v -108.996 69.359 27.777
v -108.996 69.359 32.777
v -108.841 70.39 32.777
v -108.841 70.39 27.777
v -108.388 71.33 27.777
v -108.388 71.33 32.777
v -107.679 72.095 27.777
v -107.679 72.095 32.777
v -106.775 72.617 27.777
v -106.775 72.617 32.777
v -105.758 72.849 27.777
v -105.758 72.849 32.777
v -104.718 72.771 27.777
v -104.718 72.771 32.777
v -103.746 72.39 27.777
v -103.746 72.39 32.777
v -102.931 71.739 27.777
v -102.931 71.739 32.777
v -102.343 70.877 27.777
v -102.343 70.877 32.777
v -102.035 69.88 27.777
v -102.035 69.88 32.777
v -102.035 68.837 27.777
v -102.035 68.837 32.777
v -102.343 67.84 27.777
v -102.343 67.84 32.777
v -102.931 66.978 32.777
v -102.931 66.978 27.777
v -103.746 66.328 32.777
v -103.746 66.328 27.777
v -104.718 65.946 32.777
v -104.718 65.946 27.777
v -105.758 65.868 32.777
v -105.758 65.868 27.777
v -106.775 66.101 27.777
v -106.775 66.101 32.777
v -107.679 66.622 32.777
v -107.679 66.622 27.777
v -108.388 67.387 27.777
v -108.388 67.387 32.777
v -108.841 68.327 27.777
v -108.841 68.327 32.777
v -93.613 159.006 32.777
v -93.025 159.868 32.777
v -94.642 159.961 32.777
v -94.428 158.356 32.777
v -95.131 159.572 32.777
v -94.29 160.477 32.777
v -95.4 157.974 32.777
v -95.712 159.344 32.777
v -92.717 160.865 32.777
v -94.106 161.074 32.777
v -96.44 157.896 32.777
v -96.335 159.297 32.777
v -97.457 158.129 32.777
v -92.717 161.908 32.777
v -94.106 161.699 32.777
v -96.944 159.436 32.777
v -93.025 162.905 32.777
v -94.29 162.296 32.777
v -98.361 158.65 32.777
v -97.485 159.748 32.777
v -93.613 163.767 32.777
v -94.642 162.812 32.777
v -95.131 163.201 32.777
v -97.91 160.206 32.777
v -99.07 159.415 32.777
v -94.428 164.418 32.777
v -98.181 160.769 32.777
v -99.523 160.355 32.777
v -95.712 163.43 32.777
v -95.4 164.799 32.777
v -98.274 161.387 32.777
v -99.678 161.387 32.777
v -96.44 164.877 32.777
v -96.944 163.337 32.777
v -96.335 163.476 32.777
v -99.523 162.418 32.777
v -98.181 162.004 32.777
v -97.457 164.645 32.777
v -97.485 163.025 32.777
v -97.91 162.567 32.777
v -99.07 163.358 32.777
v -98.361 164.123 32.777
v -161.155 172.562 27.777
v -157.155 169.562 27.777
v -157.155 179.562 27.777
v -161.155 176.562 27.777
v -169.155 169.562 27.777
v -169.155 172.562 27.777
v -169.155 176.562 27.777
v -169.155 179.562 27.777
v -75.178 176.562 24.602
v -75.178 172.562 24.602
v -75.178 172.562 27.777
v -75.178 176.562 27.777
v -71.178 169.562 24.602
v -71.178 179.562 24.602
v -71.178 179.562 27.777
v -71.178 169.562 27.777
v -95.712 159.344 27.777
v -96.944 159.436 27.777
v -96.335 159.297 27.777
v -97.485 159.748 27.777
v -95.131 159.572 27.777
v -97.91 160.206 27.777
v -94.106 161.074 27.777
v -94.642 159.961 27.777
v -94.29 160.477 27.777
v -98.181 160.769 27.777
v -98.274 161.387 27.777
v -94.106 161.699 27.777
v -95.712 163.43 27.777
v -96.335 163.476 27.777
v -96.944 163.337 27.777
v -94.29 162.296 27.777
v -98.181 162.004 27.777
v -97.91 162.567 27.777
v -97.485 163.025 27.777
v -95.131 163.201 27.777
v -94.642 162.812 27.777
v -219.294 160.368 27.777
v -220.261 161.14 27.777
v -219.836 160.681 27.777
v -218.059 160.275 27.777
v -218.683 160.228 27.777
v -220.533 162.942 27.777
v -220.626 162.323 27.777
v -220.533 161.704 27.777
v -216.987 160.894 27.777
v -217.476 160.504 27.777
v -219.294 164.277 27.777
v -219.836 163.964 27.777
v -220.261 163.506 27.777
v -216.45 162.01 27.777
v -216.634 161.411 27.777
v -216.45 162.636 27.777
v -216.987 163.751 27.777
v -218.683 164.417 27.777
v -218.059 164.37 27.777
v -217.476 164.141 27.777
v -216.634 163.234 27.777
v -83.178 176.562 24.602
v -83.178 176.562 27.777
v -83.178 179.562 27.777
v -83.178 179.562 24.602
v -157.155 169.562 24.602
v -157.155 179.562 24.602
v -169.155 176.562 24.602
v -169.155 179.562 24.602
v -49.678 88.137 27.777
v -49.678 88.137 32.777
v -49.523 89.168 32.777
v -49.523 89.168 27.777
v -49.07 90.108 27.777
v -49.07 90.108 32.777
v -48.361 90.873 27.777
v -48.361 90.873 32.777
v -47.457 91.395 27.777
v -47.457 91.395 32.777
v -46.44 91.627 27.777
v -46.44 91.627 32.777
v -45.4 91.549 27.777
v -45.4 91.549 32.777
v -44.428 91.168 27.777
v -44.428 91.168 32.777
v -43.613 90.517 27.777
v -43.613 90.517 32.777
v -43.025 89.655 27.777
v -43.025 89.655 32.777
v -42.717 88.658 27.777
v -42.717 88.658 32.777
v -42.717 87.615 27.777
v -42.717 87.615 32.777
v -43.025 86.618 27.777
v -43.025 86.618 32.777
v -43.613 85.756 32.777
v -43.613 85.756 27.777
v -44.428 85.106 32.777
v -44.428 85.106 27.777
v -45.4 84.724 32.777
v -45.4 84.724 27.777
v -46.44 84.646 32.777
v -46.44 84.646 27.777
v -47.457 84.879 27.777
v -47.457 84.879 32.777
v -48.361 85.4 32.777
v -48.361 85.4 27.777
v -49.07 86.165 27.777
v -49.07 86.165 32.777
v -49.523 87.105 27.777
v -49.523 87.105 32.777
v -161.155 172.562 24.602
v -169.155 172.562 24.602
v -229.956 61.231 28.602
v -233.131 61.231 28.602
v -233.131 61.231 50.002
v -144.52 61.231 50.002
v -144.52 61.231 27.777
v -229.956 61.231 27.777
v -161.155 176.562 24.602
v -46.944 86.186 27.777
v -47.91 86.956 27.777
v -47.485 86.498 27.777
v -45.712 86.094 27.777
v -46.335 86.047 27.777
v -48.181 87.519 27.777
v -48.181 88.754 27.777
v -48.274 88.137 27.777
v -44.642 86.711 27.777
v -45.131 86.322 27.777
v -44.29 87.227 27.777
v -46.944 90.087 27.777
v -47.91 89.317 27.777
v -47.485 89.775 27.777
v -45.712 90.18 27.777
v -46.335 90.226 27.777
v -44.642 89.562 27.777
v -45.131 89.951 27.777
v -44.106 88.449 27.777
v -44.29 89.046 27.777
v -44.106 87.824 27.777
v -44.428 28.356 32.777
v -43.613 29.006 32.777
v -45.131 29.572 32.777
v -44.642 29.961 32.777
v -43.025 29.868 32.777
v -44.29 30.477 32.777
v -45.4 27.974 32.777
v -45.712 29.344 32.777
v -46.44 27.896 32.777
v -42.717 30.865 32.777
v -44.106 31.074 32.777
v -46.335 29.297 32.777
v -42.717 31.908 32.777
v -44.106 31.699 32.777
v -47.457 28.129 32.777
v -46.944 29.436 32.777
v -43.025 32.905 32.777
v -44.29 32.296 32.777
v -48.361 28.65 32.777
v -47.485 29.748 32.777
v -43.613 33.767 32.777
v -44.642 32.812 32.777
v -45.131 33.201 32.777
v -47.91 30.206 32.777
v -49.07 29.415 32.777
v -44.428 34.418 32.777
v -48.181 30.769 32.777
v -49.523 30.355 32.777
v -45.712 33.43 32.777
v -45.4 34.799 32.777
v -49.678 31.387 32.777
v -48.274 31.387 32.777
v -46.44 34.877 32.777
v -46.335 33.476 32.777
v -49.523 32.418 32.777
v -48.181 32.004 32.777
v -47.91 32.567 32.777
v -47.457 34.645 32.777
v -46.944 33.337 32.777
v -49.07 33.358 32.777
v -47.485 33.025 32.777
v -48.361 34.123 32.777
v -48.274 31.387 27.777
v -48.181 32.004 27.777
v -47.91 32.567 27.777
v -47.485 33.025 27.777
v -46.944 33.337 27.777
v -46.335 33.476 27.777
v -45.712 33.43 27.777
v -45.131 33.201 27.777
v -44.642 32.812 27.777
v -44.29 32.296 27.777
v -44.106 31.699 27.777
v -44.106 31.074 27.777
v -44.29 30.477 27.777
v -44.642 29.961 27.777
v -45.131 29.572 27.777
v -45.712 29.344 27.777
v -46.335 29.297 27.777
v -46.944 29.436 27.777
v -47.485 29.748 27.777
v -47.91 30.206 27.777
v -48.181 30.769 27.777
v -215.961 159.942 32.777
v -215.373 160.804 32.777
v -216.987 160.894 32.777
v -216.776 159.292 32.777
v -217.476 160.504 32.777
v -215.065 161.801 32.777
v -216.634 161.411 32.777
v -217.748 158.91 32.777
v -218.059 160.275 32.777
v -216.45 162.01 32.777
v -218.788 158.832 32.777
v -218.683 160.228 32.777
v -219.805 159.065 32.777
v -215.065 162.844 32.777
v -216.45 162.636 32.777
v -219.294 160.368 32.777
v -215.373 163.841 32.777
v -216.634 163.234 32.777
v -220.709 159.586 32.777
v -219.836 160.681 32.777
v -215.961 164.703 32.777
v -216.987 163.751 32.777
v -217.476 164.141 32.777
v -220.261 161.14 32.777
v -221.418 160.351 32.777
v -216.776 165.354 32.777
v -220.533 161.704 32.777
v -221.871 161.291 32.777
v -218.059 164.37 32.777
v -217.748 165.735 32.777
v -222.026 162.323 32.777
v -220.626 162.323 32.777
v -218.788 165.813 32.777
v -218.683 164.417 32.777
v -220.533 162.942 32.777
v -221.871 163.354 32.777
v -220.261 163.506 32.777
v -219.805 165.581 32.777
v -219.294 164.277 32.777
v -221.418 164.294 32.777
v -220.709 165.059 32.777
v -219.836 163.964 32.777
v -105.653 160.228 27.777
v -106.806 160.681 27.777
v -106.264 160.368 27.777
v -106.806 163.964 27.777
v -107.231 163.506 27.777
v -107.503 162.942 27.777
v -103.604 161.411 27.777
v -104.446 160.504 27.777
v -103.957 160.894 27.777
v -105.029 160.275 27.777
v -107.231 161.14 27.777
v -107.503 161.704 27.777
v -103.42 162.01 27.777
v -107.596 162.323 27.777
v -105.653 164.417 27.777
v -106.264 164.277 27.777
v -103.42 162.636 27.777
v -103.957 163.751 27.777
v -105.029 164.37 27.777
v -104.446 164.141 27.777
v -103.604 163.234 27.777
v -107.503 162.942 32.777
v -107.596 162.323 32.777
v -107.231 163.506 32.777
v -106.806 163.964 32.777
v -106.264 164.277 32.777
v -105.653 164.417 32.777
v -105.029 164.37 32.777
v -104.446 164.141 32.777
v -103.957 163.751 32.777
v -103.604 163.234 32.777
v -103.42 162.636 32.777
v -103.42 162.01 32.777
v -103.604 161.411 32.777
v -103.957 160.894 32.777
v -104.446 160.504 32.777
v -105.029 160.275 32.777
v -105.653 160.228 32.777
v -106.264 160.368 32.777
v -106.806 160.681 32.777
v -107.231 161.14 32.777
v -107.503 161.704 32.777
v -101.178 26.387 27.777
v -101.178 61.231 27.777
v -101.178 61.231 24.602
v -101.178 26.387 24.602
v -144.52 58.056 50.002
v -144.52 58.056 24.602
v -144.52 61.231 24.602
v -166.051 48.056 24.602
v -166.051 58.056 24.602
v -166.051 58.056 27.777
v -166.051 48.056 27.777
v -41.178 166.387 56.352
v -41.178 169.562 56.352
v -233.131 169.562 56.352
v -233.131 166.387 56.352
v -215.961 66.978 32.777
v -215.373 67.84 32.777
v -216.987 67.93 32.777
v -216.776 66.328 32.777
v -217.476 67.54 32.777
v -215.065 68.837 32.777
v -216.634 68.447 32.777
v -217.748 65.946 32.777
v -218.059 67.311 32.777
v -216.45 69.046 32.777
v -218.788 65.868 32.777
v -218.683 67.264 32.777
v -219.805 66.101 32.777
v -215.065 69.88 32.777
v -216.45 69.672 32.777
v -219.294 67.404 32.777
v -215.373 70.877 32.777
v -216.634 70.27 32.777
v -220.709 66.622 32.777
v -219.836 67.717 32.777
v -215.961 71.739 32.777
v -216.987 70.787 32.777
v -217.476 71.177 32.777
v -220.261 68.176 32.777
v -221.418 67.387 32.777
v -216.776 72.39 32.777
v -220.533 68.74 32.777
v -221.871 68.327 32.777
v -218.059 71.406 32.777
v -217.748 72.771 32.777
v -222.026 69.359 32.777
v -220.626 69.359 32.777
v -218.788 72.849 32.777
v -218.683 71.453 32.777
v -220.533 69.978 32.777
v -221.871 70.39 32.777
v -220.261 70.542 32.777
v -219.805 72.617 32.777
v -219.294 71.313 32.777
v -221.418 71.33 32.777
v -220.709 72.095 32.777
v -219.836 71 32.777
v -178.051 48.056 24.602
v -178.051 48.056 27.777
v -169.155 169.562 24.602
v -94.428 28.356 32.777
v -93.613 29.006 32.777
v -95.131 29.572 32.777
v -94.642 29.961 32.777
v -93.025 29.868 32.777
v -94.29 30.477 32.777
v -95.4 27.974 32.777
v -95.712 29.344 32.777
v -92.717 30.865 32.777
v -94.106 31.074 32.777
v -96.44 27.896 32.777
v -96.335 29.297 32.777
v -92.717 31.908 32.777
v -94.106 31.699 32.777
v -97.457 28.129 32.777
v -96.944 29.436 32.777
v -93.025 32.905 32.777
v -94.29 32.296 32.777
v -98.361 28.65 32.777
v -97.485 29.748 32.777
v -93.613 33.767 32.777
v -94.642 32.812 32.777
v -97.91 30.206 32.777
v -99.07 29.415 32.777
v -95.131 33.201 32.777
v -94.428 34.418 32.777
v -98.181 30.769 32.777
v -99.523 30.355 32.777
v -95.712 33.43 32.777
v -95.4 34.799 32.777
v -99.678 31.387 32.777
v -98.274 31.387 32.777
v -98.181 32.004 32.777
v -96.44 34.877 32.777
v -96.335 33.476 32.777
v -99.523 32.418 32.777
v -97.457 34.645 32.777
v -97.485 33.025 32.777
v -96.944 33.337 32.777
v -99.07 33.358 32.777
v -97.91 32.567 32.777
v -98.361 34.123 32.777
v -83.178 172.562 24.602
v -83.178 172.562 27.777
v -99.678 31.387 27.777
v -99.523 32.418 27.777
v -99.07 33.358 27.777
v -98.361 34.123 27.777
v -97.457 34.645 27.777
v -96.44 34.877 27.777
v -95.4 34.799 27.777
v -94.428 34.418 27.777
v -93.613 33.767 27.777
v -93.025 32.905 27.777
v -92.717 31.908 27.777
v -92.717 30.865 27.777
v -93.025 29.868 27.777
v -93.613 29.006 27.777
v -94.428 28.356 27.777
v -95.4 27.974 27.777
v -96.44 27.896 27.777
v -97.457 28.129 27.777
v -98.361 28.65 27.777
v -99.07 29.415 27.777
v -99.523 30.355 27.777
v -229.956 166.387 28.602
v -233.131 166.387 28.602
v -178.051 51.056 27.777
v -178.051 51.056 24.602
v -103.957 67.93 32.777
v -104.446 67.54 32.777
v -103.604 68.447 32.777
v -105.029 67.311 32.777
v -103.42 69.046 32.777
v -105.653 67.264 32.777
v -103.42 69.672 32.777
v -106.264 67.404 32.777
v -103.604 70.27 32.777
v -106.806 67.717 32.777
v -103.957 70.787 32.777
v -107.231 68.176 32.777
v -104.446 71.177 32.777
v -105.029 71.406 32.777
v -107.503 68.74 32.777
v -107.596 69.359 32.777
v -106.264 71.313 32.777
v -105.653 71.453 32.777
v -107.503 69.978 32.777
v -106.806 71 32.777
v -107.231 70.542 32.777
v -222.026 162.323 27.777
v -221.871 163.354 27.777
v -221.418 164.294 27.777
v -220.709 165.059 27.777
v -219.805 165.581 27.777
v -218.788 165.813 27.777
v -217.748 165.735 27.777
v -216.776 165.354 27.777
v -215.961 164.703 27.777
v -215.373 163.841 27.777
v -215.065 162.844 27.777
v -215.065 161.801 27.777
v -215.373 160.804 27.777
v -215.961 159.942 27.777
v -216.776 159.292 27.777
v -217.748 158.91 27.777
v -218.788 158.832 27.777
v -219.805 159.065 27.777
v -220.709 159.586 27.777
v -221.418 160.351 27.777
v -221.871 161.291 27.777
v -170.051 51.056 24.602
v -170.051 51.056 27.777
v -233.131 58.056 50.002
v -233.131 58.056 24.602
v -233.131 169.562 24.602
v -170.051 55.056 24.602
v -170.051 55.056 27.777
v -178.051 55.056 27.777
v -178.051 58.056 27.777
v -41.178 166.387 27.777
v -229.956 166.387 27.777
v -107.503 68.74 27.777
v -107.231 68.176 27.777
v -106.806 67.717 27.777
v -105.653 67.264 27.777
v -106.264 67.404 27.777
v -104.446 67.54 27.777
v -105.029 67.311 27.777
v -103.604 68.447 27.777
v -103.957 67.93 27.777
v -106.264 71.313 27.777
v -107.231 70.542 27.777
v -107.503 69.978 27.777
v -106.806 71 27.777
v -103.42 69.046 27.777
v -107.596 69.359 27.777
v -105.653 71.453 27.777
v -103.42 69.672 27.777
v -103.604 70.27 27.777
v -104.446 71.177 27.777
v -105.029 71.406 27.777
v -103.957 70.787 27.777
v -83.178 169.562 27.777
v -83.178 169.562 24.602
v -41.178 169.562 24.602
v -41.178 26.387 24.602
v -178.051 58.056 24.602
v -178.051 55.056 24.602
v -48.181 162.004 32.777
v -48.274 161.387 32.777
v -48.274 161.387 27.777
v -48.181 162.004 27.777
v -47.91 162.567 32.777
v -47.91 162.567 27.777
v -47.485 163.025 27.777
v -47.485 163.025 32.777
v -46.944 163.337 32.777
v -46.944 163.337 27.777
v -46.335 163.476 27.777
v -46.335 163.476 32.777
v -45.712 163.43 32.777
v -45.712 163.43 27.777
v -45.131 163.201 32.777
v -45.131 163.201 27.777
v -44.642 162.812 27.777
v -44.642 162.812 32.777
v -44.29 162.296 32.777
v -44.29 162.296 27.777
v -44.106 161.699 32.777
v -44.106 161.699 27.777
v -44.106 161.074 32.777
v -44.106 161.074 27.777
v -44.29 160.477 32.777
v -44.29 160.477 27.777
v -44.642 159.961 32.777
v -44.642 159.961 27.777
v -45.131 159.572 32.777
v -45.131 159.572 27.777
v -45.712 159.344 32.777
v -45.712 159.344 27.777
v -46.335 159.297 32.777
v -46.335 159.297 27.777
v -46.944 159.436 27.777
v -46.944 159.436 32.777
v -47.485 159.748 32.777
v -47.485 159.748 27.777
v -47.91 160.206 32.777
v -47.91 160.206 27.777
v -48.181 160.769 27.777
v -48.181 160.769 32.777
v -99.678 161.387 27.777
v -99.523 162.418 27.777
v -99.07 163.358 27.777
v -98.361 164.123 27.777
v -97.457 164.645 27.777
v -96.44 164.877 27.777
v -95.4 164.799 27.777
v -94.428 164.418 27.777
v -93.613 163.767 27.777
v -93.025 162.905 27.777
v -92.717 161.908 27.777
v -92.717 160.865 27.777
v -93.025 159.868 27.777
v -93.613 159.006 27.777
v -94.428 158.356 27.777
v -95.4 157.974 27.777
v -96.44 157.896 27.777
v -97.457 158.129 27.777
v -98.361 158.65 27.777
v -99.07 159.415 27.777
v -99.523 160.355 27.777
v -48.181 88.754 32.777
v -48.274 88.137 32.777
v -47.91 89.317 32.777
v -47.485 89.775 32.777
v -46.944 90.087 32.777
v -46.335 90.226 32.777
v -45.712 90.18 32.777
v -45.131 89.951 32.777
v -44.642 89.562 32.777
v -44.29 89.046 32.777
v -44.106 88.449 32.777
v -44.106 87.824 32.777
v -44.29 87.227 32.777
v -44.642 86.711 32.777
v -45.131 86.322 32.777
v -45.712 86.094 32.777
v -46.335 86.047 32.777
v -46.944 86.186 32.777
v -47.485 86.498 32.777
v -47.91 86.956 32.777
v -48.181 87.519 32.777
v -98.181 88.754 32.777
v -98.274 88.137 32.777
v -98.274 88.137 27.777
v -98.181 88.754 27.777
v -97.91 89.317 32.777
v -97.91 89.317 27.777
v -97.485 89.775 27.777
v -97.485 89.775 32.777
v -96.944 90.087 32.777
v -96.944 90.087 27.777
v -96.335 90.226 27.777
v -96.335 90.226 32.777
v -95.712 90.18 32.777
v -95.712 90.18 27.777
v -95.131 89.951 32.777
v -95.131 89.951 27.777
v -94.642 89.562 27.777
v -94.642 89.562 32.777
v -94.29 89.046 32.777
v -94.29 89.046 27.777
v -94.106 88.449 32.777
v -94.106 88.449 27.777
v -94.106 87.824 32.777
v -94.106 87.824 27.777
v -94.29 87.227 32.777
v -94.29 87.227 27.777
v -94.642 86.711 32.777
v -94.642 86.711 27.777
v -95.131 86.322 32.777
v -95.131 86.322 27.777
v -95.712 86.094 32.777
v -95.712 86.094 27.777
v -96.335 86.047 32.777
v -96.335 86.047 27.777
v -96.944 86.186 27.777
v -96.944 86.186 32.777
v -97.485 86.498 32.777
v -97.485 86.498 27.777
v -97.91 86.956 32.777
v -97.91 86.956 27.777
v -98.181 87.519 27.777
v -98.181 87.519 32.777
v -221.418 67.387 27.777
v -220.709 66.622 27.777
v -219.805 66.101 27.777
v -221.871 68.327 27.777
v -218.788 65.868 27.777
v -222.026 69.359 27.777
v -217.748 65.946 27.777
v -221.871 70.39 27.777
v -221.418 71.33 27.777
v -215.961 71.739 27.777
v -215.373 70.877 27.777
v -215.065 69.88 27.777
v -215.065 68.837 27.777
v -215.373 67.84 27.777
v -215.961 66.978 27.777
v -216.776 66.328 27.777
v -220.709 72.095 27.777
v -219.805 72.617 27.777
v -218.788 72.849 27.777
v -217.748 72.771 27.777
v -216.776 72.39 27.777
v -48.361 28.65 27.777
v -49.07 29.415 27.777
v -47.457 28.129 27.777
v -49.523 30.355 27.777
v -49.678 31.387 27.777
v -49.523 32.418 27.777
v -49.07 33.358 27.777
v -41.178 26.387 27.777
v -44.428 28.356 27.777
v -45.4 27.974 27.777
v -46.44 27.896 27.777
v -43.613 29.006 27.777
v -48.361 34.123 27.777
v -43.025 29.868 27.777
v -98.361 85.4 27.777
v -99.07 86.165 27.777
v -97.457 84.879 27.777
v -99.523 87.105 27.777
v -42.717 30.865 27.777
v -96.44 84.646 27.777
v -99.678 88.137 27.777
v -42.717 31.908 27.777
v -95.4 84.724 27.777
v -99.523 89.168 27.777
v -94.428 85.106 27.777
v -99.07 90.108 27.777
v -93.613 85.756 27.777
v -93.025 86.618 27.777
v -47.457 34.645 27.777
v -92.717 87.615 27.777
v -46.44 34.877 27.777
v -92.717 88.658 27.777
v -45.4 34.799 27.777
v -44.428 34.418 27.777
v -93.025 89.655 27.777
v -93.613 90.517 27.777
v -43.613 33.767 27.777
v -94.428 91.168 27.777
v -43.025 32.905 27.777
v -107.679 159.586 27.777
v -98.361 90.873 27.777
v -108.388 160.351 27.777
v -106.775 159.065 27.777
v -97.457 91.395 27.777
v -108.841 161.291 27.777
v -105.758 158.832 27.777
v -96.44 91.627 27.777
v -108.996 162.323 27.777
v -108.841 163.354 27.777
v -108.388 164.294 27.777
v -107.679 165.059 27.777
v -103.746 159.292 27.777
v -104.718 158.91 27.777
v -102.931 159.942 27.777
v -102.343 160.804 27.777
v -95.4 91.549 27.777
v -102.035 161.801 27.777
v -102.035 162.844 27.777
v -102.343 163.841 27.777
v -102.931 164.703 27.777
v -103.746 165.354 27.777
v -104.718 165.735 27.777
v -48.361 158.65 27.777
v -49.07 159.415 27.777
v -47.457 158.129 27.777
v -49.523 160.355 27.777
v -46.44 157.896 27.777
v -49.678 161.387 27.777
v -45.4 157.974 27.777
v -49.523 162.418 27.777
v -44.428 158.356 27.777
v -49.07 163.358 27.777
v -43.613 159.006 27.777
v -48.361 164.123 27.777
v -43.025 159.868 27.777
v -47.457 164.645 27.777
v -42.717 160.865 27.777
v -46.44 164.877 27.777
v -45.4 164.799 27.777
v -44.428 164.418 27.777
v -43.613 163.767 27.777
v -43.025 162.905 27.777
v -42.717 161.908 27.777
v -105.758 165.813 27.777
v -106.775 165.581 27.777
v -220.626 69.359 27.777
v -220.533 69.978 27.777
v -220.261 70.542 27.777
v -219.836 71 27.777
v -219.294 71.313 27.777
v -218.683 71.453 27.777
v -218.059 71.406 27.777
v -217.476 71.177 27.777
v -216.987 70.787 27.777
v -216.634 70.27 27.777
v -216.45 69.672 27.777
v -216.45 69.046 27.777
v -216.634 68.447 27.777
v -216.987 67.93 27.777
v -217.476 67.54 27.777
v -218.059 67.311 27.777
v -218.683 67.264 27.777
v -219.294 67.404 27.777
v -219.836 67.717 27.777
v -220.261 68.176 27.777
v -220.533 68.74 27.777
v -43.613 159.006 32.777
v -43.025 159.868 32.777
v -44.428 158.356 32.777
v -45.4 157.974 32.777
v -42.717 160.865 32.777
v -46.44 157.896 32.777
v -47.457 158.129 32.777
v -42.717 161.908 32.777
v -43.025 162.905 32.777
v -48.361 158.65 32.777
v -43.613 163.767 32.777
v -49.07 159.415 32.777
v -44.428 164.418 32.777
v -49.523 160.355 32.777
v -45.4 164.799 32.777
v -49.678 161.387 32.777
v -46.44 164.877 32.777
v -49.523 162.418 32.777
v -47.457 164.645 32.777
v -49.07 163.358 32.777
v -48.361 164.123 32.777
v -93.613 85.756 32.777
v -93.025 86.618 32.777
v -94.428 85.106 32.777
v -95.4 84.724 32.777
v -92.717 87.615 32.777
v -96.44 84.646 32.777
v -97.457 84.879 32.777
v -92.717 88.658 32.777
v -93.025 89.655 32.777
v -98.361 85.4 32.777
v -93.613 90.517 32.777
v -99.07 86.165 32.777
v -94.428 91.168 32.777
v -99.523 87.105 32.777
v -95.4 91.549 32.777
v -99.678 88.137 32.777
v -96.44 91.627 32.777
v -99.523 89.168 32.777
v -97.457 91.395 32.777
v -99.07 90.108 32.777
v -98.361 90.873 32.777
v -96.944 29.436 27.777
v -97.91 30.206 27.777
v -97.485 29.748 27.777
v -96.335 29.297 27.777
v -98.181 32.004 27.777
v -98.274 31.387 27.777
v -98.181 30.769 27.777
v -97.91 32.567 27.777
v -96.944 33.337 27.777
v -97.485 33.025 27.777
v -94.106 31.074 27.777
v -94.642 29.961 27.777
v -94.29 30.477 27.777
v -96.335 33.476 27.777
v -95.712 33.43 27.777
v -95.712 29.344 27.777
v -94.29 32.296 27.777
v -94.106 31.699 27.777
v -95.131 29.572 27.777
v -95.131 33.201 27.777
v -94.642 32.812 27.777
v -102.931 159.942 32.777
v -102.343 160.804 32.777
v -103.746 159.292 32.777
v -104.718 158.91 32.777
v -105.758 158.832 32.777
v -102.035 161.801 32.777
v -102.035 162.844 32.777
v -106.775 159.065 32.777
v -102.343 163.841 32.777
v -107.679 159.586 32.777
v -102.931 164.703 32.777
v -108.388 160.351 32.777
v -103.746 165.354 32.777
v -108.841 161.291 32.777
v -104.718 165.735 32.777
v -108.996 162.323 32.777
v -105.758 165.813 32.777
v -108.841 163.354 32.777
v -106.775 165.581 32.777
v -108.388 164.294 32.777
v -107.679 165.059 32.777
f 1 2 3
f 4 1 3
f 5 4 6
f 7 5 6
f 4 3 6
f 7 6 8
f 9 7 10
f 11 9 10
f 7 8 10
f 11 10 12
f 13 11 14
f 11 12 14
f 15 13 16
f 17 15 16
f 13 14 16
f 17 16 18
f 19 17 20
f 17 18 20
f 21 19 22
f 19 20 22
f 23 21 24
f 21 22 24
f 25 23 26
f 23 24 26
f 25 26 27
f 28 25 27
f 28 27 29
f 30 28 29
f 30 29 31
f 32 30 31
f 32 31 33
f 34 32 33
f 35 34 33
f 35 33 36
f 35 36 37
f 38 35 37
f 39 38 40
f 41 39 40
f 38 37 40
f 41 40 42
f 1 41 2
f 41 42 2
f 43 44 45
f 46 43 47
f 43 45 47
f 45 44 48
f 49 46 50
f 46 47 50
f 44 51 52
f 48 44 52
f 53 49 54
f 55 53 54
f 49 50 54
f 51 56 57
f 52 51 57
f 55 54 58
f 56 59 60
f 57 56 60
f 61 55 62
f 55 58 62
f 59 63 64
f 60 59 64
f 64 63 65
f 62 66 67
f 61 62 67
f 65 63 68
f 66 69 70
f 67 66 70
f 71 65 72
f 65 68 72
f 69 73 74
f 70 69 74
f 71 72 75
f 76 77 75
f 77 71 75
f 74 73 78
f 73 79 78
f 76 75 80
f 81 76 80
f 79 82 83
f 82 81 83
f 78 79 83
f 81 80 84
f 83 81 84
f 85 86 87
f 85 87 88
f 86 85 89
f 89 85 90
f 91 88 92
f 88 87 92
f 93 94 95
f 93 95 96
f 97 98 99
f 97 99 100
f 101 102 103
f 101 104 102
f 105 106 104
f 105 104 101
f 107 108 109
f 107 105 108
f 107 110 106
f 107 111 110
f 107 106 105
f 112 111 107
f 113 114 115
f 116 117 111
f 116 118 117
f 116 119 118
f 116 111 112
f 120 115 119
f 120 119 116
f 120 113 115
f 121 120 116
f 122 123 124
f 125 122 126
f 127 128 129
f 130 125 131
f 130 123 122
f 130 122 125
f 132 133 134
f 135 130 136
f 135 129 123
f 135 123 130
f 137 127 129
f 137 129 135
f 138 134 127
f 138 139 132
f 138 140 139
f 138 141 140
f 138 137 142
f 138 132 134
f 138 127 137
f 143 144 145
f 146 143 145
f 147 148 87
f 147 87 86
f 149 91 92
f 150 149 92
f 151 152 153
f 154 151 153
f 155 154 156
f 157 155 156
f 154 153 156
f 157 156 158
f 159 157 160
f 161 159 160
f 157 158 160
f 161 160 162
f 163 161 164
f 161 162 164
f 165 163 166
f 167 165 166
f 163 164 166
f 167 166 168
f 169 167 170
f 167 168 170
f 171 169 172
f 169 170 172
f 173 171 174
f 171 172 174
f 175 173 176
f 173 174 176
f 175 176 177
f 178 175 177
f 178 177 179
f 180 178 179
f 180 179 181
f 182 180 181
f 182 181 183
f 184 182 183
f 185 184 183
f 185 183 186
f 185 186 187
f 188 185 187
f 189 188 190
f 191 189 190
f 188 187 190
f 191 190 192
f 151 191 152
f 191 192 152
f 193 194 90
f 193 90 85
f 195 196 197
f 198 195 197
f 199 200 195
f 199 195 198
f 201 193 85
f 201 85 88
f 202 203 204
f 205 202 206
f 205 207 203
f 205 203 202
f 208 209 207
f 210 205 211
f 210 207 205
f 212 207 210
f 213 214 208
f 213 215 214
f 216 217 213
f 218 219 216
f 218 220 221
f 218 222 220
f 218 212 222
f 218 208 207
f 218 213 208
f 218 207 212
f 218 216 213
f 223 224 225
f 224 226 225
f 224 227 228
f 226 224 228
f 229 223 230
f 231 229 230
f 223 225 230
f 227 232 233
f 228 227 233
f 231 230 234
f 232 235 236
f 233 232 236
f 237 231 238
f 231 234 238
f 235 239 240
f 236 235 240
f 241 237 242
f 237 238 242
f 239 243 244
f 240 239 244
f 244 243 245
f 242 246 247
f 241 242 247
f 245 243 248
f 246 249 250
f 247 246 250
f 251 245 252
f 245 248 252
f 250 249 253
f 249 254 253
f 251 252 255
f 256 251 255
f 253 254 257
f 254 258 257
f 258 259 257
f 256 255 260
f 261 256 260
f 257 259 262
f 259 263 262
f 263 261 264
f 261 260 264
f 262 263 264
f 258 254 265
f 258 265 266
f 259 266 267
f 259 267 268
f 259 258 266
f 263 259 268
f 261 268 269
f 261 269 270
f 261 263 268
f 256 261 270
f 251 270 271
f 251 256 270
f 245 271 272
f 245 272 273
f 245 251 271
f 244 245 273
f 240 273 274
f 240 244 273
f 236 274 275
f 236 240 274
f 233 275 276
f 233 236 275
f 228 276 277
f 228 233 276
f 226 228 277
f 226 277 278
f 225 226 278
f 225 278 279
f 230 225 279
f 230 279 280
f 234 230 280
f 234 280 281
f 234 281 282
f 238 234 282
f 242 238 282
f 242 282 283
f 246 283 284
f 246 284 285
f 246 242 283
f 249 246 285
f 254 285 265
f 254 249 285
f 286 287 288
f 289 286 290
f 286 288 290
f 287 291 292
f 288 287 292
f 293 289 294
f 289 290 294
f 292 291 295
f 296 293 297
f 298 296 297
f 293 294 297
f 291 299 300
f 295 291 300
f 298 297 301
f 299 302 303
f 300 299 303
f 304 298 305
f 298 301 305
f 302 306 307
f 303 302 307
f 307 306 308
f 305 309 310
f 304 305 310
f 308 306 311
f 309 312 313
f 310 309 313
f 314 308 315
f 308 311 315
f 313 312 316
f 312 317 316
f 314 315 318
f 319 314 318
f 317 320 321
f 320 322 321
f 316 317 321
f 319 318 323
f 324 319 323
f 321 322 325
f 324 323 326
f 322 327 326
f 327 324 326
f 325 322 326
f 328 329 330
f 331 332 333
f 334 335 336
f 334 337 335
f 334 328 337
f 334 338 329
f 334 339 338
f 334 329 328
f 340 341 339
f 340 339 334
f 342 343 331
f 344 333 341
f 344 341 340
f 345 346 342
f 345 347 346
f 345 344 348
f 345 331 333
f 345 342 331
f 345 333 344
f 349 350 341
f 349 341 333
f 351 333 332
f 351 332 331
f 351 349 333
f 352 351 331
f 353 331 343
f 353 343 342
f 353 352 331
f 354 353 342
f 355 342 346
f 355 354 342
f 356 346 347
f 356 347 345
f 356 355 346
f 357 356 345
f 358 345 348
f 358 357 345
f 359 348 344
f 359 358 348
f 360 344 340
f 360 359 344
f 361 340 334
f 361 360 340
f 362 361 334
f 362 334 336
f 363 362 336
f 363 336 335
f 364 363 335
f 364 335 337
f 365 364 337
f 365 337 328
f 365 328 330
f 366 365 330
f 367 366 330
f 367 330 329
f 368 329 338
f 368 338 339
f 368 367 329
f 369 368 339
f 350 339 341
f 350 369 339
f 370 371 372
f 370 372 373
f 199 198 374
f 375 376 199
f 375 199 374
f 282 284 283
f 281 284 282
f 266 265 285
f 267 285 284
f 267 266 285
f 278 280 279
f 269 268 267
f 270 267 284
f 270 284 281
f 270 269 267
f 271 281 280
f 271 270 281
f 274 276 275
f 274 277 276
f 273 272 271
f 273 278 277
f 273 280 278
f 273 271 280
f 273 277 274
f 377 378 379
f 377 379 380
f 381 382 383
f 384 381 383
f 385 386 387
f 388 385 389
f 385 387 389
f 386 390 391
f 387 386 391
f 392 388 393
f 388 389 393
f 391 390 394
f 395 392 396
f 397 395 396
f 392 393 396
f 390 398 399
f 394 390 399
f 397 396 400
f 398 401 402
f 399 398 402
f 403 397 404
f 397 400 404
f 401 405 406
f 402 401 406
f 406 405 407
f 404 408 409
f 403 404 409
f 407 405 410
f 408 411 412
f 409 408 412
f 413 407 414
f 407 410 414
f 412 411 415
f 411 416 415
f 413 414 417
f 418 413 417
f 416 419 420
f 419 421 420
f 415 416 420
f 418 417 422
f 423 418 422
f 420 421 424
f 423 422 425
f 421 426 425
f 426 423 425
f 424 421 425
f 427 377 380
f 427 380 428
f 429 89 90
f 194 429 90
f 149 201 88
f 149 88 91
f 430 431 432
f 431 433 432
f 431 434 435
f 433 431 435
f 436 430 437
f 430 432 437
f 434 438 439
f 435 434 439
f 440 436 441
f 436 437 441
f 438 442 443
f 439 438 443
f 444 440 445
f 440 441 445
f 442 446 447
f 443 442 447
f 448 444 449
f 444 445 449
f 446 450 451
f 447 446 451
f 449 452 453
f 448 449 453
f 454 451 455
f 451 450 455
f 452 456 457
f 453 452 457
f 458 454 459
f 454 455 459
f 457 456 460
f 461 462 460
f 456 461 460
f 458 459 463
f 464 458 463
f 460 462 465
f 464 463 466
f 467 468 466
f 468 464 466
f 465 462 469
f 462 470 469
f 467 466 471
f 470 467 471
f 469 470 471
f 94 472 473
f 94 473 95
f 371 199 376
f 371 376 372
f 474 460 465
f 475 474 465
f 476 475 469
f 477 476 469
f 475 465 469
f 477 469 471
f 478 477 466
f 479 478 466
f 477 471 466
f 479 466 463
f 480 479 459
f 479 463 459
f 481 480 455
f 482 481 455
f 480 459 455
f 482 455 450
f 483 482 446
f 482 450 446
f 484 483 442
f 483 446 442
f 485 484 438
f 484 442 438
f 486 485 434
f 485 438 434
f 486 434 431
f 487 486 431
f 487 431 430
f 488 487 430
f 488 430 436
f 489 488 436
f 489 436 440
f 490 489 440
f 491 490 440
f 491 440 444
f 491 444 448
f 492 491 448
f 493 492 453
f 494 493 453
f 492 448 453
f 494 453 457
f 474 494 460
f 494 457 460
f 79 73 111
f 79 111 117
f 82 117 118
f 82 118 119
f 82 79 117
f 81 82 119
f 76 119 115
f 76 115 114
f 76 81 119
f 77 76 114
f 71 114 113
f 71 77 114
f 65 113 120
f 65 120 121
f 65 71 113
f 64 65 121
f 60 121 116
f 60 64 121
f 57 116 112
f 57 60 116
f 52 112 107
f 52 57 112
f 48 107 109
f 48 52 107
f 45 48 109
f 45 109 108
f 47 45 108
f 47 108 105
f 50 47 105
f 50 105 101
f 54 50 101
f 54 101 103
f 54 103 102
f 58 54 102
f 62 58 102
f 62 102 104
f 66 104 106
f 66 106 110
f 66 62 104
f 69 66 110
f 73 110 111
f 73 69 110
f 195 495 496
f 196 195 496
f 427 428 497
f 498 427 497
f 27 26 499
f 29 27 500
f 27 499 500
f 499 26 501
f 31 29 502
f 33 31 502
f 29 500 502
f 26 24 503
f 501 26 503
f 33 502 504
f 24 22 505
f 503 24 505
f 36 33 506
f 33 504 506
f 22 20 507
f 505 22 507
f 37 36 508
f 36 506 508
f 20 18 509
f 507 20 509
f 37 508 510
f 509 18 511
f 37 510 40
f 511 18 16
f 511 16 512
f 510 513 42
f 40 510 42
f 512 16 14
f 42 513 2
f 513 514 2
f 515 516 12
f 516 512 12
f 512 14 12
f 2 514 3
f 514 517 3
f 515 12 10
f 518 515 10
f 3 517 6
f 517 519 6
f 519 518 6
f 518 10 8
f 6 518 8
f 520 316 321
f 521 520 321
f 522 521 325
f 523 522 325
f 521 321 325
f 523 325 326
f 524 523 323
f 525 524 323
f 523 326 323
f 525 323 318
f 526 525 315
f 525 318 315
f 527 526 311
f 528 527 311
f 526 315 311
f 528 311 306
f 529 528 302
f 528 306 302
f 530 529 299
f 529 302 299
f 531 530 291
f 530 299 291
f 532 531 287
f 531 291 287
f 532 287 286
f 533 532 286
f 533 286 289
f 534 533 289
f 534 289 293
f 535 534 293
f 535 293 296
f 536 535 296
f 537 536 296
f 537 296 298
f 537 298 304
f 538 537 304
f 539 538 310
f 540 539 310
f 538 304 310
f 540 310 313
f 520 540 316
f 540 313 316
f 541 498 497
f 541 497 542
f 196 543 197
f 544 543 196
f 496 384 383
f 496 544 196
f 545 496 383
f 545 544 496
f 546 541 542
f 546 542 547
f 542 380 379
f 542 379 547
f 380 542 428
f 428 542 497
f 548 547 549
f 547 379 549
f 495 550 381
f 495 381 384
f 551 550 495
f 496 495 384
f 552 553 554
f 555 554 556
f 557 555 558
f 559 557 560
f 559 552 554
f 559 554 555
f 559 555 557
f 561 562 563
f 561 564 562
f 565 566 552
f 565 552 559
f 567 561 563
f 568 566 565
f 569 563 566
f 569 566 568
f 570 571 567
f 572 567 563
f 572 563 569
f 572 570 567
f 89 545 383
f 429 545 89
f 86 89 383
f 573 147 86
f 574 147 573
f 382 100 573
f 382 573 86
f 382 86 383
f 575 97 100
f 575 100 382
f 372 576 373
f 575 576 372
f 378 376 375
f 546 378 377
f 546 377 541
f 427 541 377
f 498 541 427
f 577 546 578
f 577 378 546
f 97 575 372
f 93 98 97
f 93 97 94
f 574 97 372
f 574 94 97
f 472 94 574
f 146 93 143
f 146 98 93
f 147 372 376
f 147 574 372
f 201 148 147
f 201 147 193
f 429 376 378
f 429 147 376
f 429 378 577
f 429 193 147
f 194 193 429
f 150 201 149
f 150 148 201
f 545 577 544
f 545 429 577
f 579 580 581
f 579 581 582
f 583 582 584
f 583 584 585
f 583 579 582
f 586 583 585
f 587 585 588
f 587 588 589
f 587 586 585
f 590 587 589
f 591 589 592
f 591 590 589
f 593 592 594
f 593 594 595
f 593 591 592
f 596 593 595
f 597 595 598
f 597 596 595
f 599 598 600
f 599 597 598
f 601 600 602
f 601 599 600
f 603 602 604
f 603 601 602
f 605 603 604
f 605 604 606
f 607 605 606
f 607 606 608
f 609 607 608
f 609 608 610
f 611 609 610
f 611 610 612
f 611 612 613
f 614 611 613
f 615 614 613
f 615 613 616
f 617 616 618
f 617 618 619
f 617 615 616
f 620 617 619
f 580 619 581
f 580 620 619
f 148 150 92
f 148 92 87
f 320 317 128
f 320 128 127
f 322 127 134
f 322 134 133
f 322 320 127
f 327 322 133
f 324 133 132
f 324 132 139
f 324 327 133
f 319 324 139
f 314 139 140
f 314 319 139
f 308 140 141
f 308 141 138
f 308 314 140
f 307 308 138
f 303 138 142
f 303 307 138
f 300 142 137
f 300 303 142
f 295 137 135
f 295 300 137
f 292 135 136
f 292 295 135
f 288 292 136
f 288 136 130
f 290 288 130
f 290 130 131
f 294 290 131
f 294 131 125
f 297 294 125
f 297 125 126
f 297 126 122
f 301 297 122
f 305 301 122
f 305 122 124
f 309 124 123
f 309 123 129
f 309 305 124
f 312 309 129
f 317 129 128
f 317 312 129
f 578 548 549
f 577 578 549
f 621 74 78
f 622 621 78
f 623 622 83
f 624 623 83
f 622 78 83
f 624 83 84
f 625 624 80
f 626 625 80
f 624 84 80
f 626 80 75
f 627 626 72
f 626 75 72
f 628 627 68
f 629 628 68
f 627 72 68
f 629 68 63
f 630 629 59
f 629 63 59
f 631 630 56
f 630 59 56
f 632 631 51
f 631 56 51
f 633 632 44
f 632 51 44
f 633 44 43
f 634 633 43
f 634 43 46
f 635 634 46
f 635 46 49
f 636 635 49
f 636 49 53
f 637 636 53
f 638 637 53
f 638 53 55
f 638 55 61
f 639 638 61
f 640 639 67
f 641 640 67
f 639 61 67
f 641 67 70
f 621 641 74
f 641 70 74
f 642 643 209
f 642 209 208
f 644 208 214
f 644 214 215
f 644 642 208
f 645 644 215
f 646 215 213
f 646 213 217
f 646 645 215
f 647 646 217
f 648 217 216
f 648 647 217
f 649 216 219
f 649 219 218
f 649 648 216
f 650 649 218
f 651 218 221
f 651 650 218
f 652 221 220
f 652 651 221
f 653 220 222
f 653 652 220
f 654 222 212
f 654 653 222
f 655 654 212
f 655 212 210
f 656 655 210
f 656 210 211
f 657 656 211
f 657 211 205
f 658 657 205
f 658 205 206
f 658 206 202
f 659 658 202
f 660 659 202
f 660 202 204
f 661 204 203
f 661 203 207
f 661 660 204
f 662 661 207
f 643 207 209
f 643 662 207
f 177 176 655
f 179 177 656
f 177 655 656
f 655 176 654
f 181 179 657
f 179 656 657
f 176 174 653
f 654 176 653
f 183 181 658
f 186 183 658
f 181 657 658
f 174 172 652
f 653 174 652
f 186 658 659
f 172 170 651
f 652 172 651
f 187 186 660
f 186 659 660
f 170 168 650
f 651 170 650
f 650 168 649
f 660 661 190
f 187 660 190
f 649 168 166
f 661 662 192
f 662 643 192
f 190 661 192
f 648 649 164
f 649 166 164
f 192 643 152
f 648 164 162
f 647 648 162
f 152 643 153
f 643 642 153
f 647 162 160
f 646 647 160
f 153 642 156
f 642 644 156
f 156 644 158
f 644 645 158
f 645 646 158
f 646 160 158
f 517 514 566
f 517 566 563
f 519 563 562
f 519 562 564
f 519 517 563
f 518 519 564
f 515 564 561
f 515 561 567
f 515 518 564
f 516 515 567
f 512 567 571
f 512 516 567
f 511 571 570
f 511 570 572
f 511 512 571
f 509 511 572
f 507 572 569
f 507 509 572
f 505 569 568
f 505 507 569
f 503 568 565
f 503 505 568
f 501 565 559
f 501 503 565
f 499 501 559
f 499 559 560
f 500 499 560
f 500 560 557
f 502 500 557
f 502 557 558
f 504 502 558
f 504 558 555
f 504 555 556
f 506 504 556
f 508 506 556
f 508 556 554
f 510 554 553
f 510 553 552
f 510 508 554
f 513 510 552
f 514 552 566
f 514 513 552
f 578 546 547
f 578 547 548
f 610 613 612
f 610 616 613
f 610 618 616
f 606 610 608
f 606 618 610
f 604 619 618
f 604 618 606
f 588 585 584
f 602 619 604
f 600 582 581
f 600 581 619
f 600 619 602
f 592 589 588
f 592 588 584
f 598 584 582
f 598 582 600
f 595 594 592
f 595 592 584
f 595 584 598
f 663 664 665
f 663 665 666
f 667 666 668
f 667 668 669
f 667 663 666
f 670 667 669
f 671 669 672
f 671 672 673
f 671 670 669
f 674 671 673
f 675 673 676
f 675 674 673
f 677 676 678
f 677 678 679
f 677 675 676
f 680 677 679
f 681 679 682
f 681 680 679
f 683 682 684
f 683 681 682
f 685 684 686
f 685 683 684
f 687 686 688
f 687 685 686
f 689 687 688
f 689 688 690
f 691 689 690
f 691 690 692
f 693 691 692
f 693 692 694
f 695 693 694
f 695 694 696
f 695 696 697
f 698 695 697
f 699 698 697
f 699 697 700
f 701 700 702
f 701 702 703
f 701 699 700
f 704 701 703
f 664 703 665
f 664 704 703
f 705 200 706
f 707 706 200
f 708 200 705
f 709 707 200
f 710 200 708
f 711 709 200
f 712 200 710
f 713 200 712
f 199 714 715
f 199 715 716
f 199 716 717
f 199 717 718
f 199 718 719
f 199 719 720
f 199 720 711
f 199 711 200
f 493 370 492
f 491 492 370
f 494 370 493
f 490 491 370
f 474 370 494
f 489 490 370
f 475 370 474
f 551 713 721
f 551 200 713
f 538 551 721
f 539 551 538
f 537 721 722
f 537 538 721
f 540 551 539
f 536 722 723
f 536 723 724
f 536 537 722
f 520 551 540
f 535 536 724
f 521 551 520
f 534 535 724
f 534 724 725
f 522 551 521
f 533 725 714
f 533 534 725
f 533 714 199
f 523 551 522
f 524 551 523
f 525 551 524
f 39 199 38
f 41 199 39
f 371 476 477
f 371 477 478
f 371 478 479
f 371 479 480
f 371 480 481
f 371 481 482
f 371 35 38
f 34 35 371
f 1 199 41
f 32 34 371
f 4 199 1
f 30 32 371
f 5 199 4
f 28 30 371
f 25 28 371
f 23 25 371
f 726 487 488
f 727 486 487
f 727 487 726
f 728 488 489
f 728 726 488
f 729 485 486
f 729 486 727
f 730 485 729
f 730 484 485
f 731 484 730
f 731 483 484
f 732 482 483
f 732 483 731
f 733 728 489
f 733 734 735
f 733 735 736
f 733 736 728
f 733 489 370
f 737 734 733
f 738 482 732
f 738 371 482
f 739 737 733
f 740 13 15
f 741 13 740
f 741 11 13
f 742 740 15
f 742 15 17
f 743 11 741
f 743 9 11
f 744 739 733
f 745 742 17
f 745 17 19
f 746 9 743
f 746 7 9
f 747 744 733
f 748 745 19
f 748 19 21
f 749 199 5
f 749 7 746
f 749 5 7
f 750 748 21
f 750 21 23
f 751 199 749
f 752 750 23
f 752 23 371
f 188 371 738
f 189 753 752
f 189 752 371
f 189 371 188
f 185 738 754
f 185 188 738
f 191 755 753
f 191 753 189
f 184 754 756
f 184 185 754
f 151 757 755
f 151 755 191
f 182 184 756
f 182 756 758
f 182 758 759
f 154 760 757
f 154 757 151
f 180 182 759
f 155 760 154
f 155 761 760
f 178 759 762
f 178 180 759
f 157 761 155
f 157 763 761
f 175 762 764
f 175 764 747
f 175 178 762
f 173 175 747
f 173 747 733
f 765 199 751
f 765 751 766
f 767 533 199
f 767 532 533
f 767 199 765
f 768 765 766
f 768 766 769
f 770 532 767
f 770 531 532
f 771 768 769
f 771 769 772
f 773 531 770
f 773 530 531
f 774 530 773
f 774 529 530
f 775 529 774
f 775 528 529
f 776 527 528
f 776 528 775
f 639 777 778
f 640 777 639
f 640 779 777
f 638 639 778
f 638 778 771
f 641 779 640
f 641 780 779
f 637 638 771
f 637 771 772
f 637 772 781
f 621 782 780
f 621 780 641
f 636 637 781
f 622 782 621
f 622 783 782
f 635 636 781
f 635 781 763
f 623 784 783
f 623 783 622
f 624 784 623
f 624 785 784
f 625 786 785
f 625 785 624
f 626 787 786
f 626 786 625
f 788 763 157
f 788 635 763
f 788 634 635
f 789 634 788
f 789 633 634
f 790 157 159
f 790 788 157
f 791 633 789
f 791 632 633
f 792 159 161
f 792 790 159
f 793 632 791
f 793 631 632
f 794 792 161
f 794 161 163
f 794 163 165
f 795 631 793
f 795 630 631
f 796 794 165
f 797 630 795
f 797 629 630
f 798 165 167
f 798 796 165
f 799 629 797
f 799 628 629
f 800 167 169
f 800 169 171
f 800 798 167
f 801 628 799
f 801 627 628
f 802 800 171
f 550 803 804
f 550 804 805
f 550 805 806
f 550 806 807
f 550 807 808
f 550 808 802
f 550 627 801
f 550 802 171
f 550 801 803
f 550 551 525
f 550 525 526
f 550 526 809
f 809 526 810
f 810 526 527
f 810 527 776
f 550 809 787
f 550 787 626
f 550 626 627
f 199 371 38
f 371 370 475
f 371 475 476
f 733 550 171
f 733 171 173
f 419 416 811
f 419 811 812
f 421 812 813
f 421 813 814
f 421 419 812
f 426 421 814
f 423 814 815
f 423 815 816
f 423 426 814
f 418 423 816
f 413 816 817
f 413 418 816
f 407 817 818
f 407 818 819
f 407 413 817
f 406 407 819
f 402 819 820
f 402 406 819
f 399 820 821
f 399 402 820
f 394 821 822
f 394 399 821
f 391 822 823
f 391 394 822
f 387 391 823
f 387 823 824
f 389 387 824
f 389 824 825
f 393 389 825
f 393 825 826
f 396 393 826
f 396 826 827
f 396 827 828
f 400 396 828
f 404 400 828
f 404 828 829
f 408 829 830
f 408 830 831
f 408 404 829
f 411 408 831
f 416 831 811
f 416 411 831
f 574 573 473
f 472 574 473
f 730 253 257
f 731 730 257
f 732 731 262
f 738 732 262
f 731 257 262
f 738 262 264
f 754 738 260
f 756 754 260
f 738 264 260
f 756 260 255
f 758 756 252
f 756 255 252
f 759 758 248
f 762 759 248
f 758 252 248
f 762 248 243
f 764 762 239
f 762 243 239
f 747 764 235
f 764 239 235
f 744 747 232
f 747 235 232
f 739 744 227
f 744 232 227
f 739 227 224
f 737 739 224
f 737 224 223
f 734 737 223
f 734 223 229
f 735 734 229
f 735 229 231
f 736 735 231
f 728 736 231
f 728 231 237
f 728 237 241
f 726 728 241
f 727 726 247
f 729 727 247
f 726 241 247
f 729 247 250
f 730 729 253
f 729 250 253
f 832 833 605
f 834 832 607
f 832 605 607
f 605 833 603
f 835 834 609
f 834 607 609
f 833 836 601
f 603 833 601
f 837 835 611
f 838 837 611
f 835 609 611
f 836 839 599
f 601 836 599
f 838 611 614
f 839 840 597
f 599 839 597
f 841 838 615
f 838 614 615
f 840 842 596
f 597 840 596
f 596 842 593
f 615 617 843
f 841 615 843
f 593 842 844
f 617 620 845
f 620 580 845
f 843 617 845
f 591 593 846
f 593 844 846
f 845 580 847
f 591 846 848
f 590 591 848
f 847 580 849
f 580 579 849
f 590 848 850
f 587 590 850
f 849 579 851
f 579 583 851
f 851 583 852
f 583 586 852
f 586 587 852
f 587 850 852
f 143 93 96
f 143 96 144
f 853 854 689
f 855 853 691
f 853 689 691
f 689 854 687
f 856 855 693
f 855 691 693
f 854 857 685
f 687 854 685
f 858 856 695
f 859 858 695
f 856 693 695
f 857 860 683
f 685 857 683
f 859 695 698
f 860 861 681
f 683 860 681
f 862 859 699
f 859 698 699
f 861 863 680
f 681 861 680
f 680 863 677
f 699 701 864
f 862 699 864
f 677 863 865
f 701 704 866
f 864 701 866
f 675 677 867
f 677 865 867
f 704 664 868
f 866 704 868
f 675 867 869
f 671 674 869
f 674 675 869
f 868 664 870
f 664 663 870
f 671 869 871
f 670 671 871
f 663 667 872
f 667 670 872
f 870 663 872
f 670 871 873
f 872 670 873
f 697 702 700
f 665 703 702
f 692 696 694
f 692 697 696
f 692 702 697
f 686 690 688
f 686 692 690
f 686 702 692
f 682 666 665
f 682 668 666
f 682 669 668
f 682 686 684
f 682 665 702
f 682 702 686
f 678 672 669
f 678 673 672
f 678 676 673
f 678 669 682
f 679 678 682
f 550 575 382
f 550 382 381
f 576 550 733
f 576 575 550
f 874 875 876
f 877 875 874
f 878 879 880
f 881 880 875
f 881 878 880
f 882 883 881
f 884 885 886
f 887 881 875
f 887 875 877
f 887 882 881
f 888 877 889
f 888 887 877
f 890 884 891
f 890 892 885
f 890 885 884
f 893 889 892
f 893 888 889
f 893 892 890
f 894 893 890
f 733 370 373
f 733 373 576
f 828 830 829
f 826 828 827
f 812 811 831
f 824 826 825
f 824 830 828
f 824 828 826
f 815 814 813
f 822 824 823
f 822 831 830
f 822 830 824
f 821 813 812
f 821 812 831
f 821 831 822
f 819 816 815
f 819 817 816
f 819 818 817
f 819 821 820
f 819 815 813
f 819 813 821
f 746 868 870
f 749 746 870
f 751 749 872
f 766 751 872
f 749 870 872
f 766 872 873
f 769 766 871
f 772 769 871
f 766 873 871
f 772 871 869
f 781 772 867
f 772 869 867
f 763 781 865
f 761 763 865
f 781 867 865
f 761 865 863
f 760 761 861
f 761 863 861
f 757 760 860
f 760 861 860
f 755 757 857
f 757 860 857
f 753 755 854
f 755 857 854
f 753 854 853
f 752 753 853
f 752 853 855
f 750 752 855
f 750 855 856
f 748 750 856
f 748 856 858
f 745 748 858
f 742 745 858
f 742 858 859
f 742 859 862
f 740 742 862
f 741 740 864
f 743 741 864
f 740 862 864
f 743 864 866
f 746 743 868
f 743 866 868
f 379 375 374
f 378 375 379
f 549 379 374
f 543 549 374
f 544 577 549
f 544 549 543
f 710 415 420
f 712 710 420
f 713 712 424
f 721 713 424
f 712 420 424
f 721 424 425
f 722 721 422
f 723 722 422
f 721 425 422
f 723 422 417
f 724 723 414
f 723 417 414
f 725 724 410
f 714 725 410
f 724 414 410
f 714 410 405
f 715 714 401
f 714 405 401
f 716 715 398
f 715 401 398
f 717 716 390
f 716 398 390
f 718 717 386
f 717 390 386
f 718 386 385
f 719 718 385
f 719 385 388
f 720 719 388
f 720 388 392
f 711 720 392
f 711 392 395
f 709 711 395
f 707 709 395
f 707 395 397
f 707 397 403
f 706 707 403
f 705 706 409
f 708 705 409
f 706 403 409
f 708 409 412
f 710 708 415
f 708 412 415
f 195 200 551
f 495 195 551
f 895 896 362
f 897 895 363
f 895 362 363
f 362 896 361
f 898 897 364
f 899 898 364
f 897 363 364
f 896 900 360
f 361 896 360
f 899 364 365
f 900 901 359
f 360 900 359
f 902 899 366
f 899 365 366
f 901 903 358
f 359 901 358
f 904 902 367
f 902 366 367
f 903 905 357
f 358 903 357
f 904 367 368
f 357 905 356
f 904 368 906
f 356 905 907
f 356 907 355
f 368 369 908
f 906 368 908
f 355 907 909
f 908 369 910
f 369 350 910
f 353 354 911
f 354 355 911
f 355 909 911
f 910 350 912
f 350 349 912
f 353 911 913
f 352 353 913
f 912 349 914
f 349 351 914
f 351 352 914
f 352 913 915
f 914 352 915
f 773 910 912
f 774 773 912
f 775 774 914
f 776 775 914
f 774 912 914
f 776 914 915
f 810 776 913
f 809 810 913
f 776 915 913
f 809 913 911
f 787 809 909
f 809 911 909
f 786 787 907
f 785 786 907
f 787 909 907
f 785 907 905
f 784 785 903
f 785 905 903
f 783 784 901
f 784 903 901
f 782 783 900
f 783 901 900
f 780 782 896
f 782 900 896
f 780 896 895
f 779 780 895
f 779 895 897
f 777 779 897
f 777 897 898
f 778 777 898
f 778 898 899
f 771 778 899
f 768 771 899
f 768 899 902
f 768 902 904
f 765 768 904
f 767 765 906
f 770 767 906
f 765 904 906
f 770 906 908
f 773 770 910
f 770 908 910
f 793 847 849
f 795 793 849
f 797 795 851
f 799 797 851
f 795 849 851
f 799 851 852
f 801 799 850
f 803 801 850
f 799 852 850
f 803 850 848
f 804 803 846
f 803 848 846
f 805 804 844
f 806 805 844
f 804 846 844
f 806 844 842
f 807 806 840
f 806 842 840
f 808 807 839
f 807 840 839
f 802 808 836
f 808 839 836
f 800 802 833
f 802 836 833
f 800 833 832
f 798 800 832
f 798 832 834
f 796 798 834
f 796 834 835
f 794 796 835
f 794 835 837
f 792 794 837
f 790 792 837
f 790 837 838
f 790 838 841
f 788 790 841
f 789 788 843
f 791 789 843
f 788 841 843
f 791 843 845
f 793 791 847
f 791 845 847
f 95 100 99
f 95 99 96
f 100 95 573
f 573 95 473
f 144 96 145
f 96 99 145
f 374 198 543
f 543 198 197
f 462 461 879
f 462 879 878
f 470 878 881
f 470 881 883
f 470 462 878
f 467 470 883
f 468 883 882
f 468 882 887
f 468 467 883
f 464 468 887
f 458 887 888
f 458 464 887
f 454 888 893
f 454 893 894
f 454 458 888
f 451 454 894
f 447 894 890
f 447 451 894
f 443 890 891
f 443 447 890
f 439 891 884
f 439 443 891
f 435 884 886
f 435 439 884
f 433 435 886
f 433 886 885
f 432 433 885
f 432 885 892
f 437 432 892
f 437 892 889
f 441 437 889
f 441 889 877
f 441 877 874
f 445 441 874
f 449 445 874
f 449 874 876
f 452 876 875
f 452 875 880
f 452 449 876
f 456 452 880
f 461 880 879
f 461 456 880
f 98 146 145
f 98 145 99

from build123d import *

# Parameters (mm, degrees)
SKETCH2_R              = 3.5
SKETCH2_R_2            = 2.0955
BOSS_EXTRUDE1_DEPTH    = 5
BOSS_EXTRUDE1_2_DEPTH  = 5
SKETCH2_R_3            = 2.1
BOSS_EXTRUDE1_3_DEPTH  = 5
BOSS_EXTRUDE1_4_DEPTH  = 5
BOSS_EXTRUDE1_5_DEPTH  = 5
BOSS_EXTRUDE1_6_DEPTH  = 5
BOSS_EXTRUDE1_7_DEPTH  = 5
BOSS_EXTRUDE1_8_DEPTH  = 5
BOSS_EXTRUDE1_9_DEPTH  = 5
BOSS_EXTRUDE1_10_DEPTH = 5
BOSS_EXTRUDE2_DEPTH    = 3.175
BOSS_EXTRUDE3_DEPTH    = 25.4
BOSS_EXTRUDE4_DEPTH    = 16
BOSS_EXTRUDE5_DEPTH    = 3.175
BOSS_EXTRUDE6_DEPTH    = 31.75
SKETCH4_5_W            = 3.175
SKETCH4_5_H            = 105.156
BOSS_EXTRUDE7_DEPTH    = 4
BOSS_EXTRUDE8_DEPTH    = 3.175


with BuildPart() as part:
    # Sketch2 → Boss-Extrude1 (new body)
    with BuildSketch(Plane(origin=(0, 0, 32.776775543), x_dir=(-1, 0, 0), z_dir=(0, 0, -1))):
        with Locations((46.17832863, 161.386626861)):
            Circle(SKETCH2_R)
        with Locations((46.17832863, 161.386626861)):
            Circle(SKETCH2_R_2, mode=Mode.SUBTRACT)
    extrude(amount=BOSS_EXTRUDE1_DEPTH)



with BuildPart() as body_2:
    # Sketch2 → Boss-Extrude1 2 (new body)
    with BuildSketch(Plane(origin=(0, 0, 32.776775543), x_dir=(-1, 0, 0), z_dir=(0, 0, -1))):
        with Locations((96.17832863, 161.386626861)):
            Circle(SKETCH2_R)
        with Locations((96.17832863, 161.386626861)):
            Circle(SKETCH2_R_2, mode=Mode.SUBTRACT)
    extrude(amount=BOSS_EXTRUDE1_2_DEPTH)


with BuildPart() as body_3:
    # Sketch2 → Boss-Extrude1 3 (new body)
    with BuildSketch(Plane(origin=(0, 0, 32.776775543), x_dir=(-1, 0, 0), z_dir=(0, 0, -1))):
        with Locations((105.49632863, 162.322626861)):
            Circle(SKETCH2_R)
        with Locations((105.49632863, 162.322626861)):
            Circle(SKETCH2_R_3, mode=Mode.SUBTRACT)
    extrude(amount=BOSS_EXTRUDE1_3_DEPTH)


with BuildPart() as body_4:
    # Sketch2 → Boss-Extrude1 4 (new body)
    with BuildSketch(Plane(origin=(0, 0, 32.776775543), x_dir=(-1, 0, 0), z_dir=(0, 0, -1))):
        with Locations((218.52632863, 162.322626861)):
            Circle(SKETCH2_R)
        with Locations((218.52632863, 162.322626861)):
            Circle(SKETCH2_R_3, mode=Mode.SUBTRACT)
    extrude(amount=BOSS_EXTRUDE1_4_DEPTH)


with BuildPart() as body_5:
    # Sketch2 → Boss-Extrude1 5 (new body)
    with BuildSketch(Plane(origin=(0, 0, 32.776775543), x_dir=(-1, 0, 0), z_dir=(0, 0, -1))):
        with Locations((46.17832863, 88.136626861)):
            Circle(SKETCH2_R)
        with Locations((46.17832863, 88.136626861)):
            Circle(SKETCH2_R_2, mode=Mode.SUBTRACT)
    extrude(amount=BOSS_EXTRUDE1_5_DEPTH)


with BuildPart() as body_6:
    # Sketch2 → Boss-Extrude1 6 (new body)
    with BuildSketch(Plane(origin=(0, 0, 32.776775543), x_dir=(-1, 0, 0), z_dir=(0, 0, -1))):
        with Locations((46.17832863, 31.386626861)):
            Circle(SKETCH2_R)
        with Locations((46.17832863, 31.386626861)):
            Circle(SKETCH2_R_2, mode=Mode.SUBTRACT)
    extrude(amount=BOSS_EXTRUDE1_6_DEPTH)


with BuildPart() as body_7:
    # Sketch2 → Boss-Extrude1 7 (new body)
    with BuildSketch(Plane(origin=(0, 0, 32.776775543), x_dir=(-1, 0, 0), z_dir=(0, 0, -1))):
        with Locations((96.17832863, 31.386626861)):
            Circle(SKETCH2_R)
        with Locations((96.17832863, 31.386626861)):
            Circle(SKETCH2_R_2, mode=Mode.SUBTRACT)
    extrude(amount=BOSS_EXTRUDE1_7_DEPTH)


with BuildPart() as body_8:
    # Sketch2 → Boss-Extrude1 8 (new body)
    with BuildSketch(Plane(origin=(0, 0, 32.776775543), x_dir=(-1, 0, 0), z_dir=(0, 0, -1))):
        with Locations((96.17832863, 88.136626861)):
            Circle(SKETCH2_R)
        with Locations((96.17832863, 88.136626861)):
            Circle(SKETCH2_R_2, mode=Mode.SUBTRACT)
    extrude(amount=BOSS_EXTRUDE1_8_DEPTH)


with BuildPart() as body_9:
    # Sketch2 → Boss-Extrude1 9 (new body)
    with BuildSketch(Plane(origin=(0, 0, 32.776775543), x_dir=(-1, 0, 0), z_dir=(0, 0, -1))):
        with Locations((105.49632863, 69.358626861)):
            Circle(SKETCH2_R)
        with Locations((105.49632863, 69.358626861)):
            Circle(SKETCH2_R_3, mode=Mode.SUBTRACT)
    extrude(amount=BOSS_EXTRUDE1_9_DEPTH)


with BuildPart() as body_10:
    # Sketch2 → Boss-Extrude1 10 (new body)
    with BuildSketch(Plane(origin=(0, 0, 32.776775543), x_dir=(-1, 0, 0), z_dir=(0, 0, -1))):
        with Locations((218.52632863, 69.358626861)):
            Circle(SKETCH2_R)
        with Locations((218.52632863, 69.358626861)):
            Circle(SKETCH2_R_3, mode=Mode.SUBTRACT)
    extrude(amount=BOSS_EXTRUDE1_10_DEPTH)


with BuildPart() as part_1:
    add(part.part)

    add(body_2.part)  # Boss-Extrude2 merges body 2

    add(body_3.part)  # Boss-Extrude2 merges body 3

    add(body_4.part)  # Boss-Extrude2 merges body 4

    add(body_5.part)  # Boss-Extrude2 merges body 5

    add(body_6.part)  # Boss-Extrude2 merges body 6

    add(body_7.part)  # Boss-Extrude2 merges body 7

    add(body_8.part)  # Boss-Extrude2 merges body 8

    add(body_9.part)  # Boss-Extrude2 merges body 9

    add(body_10.part)  # Boss-Extrude2 merges body 10
    # Sketch3 → Boss-Extrude2 (add)
    with BuildSketch(Plane(origin=(0, 0, 27.776775543), x_dir=(-1, 0, 0), z_dir=(0, 0, -1))):
        Polygon((41.17832863, 166.386626861), (229.95632863, 166.386626861), (229.95632863, 61.230626861), (101.17832863, 61.230626861), (101.17832863, 26.386626861), (41.17832863, 26.386626861), (41.17832863, 61.230626861), align=None)
    extrude(amount=BOSS_EXTRUDE2_DEPTH)

    # Sketch4 → Boss-Extrude3 (add)
    with BuildSketch(Plane(origin=(0, 0, 24.601775543), x_dir=(-1, 0, 0), z_dir=(0, 0, -1))):
        Polygon((233.13132863, 61.230626861), (229.95632863, 61.230626861), (144.520113107, 61.230626861), (144.520113107, 58.055626861), (233.13132863, 58.055626861), align=None)
    extrude(amount=-BOSS_EXTRUDE3_DEPTH)

    # Sketch4<3> → Boss-Extrude4 (add)
    with BuildSketch(Plane(origin=(0, 0, 24.601775543), x_dir=(-1, 0, 0), z_dir=(0, 0, -1))):
        Polygon((144.520113107, 61.230626861), (144.520113107, 58.055626861), (233.13132863, 58.055626861), (233.13132863, 61.230626861), (229.95632863, 61.230626861), align=None)
    extrude(amount=-BOSS_EXTRUDE4_DEPTH)

    # Sketch5 → Boss-Extrude5 (add)
    with BuildSketch(Plane(origin=(0, 0, 24.601775543), x_dir=(-1, 0, 0), z_dir=(0, 0, -1))):
        Polygon((166.051482846, 58.055626861), (166.051482846, 48.055626861), (178.051482846, 48.055626861), (178.051482846, 51.055626861), (170.051482846, 51.055626861), (170.051482846, 55.055626861), (178.051482846, 55.055626861), (178.051482846, 58.055626861), align=None)
    extrude(amount=-BOSS_EXTRUDE5_DEPTH)

    # Sketch4<4> → Boss-Extrude6 (add)
    with BuildSketch(Plane(origin=(0, 0, 24.601775543), x_dir=(-1, 0, 0), z_dir=(0, 0, -1))):
        Polygon((41.17832863, 169.561626861), (41.17832863, 166.386626861), (229.95632863, 166.386626861), (233.13132863, 166.386626861), (233.13132863, 169.561626861), align=None)
    extrude(amount=-BOSS_EXTRUDE6_DEPTH)

    # Sketch4<5> → Boss-Extrude7 (add)
    with BuildSketch(Plane(origin=(0, 0, 24.601775543), x_dir=(-1, 0, 0), z_dir=(0, 0, -1))):
        with Locations((231.54382863, 113.808626861)):
            Rectangle(SKETCH4_5_W, SKETCH4_5_H)
    extrude(amount=-BOSS_EXTRUDE7_DEPTH)

    # Sketch6 → Boss-Extrude8 (add)
    with BuildSketch(Plane(origin=(0, 0, 24.601775543), x_dir=(-1, 0, 0), z_dir=(0, 0, -1))):
        Polygon((71.17832863, 169.561626861), (83.17832863, 169.561626861), (83.17832863, 172.561626861), (75.17832863, 172.561626861), (75.17832863, 176.561626861), (83.17832863, 176.561626861), (83.17832863, 179.561626861), (71.17832863, 179.561626861), align=None)
        Polygon((157.15482863, 179.561626861), (157.15482863, 169.561626861), (169.15482863, 169.561626861), (169.15482863, 172.561626861), (161.15482863, 172.561626861), (161.15482863, 176.561626861), (169.15482863, 176.561626861), (169.15482863, 179.561626861), align=None)
    extrude(amount=-BOSS_EXTRUDE8_DEPTH)


solid = part_1.part
